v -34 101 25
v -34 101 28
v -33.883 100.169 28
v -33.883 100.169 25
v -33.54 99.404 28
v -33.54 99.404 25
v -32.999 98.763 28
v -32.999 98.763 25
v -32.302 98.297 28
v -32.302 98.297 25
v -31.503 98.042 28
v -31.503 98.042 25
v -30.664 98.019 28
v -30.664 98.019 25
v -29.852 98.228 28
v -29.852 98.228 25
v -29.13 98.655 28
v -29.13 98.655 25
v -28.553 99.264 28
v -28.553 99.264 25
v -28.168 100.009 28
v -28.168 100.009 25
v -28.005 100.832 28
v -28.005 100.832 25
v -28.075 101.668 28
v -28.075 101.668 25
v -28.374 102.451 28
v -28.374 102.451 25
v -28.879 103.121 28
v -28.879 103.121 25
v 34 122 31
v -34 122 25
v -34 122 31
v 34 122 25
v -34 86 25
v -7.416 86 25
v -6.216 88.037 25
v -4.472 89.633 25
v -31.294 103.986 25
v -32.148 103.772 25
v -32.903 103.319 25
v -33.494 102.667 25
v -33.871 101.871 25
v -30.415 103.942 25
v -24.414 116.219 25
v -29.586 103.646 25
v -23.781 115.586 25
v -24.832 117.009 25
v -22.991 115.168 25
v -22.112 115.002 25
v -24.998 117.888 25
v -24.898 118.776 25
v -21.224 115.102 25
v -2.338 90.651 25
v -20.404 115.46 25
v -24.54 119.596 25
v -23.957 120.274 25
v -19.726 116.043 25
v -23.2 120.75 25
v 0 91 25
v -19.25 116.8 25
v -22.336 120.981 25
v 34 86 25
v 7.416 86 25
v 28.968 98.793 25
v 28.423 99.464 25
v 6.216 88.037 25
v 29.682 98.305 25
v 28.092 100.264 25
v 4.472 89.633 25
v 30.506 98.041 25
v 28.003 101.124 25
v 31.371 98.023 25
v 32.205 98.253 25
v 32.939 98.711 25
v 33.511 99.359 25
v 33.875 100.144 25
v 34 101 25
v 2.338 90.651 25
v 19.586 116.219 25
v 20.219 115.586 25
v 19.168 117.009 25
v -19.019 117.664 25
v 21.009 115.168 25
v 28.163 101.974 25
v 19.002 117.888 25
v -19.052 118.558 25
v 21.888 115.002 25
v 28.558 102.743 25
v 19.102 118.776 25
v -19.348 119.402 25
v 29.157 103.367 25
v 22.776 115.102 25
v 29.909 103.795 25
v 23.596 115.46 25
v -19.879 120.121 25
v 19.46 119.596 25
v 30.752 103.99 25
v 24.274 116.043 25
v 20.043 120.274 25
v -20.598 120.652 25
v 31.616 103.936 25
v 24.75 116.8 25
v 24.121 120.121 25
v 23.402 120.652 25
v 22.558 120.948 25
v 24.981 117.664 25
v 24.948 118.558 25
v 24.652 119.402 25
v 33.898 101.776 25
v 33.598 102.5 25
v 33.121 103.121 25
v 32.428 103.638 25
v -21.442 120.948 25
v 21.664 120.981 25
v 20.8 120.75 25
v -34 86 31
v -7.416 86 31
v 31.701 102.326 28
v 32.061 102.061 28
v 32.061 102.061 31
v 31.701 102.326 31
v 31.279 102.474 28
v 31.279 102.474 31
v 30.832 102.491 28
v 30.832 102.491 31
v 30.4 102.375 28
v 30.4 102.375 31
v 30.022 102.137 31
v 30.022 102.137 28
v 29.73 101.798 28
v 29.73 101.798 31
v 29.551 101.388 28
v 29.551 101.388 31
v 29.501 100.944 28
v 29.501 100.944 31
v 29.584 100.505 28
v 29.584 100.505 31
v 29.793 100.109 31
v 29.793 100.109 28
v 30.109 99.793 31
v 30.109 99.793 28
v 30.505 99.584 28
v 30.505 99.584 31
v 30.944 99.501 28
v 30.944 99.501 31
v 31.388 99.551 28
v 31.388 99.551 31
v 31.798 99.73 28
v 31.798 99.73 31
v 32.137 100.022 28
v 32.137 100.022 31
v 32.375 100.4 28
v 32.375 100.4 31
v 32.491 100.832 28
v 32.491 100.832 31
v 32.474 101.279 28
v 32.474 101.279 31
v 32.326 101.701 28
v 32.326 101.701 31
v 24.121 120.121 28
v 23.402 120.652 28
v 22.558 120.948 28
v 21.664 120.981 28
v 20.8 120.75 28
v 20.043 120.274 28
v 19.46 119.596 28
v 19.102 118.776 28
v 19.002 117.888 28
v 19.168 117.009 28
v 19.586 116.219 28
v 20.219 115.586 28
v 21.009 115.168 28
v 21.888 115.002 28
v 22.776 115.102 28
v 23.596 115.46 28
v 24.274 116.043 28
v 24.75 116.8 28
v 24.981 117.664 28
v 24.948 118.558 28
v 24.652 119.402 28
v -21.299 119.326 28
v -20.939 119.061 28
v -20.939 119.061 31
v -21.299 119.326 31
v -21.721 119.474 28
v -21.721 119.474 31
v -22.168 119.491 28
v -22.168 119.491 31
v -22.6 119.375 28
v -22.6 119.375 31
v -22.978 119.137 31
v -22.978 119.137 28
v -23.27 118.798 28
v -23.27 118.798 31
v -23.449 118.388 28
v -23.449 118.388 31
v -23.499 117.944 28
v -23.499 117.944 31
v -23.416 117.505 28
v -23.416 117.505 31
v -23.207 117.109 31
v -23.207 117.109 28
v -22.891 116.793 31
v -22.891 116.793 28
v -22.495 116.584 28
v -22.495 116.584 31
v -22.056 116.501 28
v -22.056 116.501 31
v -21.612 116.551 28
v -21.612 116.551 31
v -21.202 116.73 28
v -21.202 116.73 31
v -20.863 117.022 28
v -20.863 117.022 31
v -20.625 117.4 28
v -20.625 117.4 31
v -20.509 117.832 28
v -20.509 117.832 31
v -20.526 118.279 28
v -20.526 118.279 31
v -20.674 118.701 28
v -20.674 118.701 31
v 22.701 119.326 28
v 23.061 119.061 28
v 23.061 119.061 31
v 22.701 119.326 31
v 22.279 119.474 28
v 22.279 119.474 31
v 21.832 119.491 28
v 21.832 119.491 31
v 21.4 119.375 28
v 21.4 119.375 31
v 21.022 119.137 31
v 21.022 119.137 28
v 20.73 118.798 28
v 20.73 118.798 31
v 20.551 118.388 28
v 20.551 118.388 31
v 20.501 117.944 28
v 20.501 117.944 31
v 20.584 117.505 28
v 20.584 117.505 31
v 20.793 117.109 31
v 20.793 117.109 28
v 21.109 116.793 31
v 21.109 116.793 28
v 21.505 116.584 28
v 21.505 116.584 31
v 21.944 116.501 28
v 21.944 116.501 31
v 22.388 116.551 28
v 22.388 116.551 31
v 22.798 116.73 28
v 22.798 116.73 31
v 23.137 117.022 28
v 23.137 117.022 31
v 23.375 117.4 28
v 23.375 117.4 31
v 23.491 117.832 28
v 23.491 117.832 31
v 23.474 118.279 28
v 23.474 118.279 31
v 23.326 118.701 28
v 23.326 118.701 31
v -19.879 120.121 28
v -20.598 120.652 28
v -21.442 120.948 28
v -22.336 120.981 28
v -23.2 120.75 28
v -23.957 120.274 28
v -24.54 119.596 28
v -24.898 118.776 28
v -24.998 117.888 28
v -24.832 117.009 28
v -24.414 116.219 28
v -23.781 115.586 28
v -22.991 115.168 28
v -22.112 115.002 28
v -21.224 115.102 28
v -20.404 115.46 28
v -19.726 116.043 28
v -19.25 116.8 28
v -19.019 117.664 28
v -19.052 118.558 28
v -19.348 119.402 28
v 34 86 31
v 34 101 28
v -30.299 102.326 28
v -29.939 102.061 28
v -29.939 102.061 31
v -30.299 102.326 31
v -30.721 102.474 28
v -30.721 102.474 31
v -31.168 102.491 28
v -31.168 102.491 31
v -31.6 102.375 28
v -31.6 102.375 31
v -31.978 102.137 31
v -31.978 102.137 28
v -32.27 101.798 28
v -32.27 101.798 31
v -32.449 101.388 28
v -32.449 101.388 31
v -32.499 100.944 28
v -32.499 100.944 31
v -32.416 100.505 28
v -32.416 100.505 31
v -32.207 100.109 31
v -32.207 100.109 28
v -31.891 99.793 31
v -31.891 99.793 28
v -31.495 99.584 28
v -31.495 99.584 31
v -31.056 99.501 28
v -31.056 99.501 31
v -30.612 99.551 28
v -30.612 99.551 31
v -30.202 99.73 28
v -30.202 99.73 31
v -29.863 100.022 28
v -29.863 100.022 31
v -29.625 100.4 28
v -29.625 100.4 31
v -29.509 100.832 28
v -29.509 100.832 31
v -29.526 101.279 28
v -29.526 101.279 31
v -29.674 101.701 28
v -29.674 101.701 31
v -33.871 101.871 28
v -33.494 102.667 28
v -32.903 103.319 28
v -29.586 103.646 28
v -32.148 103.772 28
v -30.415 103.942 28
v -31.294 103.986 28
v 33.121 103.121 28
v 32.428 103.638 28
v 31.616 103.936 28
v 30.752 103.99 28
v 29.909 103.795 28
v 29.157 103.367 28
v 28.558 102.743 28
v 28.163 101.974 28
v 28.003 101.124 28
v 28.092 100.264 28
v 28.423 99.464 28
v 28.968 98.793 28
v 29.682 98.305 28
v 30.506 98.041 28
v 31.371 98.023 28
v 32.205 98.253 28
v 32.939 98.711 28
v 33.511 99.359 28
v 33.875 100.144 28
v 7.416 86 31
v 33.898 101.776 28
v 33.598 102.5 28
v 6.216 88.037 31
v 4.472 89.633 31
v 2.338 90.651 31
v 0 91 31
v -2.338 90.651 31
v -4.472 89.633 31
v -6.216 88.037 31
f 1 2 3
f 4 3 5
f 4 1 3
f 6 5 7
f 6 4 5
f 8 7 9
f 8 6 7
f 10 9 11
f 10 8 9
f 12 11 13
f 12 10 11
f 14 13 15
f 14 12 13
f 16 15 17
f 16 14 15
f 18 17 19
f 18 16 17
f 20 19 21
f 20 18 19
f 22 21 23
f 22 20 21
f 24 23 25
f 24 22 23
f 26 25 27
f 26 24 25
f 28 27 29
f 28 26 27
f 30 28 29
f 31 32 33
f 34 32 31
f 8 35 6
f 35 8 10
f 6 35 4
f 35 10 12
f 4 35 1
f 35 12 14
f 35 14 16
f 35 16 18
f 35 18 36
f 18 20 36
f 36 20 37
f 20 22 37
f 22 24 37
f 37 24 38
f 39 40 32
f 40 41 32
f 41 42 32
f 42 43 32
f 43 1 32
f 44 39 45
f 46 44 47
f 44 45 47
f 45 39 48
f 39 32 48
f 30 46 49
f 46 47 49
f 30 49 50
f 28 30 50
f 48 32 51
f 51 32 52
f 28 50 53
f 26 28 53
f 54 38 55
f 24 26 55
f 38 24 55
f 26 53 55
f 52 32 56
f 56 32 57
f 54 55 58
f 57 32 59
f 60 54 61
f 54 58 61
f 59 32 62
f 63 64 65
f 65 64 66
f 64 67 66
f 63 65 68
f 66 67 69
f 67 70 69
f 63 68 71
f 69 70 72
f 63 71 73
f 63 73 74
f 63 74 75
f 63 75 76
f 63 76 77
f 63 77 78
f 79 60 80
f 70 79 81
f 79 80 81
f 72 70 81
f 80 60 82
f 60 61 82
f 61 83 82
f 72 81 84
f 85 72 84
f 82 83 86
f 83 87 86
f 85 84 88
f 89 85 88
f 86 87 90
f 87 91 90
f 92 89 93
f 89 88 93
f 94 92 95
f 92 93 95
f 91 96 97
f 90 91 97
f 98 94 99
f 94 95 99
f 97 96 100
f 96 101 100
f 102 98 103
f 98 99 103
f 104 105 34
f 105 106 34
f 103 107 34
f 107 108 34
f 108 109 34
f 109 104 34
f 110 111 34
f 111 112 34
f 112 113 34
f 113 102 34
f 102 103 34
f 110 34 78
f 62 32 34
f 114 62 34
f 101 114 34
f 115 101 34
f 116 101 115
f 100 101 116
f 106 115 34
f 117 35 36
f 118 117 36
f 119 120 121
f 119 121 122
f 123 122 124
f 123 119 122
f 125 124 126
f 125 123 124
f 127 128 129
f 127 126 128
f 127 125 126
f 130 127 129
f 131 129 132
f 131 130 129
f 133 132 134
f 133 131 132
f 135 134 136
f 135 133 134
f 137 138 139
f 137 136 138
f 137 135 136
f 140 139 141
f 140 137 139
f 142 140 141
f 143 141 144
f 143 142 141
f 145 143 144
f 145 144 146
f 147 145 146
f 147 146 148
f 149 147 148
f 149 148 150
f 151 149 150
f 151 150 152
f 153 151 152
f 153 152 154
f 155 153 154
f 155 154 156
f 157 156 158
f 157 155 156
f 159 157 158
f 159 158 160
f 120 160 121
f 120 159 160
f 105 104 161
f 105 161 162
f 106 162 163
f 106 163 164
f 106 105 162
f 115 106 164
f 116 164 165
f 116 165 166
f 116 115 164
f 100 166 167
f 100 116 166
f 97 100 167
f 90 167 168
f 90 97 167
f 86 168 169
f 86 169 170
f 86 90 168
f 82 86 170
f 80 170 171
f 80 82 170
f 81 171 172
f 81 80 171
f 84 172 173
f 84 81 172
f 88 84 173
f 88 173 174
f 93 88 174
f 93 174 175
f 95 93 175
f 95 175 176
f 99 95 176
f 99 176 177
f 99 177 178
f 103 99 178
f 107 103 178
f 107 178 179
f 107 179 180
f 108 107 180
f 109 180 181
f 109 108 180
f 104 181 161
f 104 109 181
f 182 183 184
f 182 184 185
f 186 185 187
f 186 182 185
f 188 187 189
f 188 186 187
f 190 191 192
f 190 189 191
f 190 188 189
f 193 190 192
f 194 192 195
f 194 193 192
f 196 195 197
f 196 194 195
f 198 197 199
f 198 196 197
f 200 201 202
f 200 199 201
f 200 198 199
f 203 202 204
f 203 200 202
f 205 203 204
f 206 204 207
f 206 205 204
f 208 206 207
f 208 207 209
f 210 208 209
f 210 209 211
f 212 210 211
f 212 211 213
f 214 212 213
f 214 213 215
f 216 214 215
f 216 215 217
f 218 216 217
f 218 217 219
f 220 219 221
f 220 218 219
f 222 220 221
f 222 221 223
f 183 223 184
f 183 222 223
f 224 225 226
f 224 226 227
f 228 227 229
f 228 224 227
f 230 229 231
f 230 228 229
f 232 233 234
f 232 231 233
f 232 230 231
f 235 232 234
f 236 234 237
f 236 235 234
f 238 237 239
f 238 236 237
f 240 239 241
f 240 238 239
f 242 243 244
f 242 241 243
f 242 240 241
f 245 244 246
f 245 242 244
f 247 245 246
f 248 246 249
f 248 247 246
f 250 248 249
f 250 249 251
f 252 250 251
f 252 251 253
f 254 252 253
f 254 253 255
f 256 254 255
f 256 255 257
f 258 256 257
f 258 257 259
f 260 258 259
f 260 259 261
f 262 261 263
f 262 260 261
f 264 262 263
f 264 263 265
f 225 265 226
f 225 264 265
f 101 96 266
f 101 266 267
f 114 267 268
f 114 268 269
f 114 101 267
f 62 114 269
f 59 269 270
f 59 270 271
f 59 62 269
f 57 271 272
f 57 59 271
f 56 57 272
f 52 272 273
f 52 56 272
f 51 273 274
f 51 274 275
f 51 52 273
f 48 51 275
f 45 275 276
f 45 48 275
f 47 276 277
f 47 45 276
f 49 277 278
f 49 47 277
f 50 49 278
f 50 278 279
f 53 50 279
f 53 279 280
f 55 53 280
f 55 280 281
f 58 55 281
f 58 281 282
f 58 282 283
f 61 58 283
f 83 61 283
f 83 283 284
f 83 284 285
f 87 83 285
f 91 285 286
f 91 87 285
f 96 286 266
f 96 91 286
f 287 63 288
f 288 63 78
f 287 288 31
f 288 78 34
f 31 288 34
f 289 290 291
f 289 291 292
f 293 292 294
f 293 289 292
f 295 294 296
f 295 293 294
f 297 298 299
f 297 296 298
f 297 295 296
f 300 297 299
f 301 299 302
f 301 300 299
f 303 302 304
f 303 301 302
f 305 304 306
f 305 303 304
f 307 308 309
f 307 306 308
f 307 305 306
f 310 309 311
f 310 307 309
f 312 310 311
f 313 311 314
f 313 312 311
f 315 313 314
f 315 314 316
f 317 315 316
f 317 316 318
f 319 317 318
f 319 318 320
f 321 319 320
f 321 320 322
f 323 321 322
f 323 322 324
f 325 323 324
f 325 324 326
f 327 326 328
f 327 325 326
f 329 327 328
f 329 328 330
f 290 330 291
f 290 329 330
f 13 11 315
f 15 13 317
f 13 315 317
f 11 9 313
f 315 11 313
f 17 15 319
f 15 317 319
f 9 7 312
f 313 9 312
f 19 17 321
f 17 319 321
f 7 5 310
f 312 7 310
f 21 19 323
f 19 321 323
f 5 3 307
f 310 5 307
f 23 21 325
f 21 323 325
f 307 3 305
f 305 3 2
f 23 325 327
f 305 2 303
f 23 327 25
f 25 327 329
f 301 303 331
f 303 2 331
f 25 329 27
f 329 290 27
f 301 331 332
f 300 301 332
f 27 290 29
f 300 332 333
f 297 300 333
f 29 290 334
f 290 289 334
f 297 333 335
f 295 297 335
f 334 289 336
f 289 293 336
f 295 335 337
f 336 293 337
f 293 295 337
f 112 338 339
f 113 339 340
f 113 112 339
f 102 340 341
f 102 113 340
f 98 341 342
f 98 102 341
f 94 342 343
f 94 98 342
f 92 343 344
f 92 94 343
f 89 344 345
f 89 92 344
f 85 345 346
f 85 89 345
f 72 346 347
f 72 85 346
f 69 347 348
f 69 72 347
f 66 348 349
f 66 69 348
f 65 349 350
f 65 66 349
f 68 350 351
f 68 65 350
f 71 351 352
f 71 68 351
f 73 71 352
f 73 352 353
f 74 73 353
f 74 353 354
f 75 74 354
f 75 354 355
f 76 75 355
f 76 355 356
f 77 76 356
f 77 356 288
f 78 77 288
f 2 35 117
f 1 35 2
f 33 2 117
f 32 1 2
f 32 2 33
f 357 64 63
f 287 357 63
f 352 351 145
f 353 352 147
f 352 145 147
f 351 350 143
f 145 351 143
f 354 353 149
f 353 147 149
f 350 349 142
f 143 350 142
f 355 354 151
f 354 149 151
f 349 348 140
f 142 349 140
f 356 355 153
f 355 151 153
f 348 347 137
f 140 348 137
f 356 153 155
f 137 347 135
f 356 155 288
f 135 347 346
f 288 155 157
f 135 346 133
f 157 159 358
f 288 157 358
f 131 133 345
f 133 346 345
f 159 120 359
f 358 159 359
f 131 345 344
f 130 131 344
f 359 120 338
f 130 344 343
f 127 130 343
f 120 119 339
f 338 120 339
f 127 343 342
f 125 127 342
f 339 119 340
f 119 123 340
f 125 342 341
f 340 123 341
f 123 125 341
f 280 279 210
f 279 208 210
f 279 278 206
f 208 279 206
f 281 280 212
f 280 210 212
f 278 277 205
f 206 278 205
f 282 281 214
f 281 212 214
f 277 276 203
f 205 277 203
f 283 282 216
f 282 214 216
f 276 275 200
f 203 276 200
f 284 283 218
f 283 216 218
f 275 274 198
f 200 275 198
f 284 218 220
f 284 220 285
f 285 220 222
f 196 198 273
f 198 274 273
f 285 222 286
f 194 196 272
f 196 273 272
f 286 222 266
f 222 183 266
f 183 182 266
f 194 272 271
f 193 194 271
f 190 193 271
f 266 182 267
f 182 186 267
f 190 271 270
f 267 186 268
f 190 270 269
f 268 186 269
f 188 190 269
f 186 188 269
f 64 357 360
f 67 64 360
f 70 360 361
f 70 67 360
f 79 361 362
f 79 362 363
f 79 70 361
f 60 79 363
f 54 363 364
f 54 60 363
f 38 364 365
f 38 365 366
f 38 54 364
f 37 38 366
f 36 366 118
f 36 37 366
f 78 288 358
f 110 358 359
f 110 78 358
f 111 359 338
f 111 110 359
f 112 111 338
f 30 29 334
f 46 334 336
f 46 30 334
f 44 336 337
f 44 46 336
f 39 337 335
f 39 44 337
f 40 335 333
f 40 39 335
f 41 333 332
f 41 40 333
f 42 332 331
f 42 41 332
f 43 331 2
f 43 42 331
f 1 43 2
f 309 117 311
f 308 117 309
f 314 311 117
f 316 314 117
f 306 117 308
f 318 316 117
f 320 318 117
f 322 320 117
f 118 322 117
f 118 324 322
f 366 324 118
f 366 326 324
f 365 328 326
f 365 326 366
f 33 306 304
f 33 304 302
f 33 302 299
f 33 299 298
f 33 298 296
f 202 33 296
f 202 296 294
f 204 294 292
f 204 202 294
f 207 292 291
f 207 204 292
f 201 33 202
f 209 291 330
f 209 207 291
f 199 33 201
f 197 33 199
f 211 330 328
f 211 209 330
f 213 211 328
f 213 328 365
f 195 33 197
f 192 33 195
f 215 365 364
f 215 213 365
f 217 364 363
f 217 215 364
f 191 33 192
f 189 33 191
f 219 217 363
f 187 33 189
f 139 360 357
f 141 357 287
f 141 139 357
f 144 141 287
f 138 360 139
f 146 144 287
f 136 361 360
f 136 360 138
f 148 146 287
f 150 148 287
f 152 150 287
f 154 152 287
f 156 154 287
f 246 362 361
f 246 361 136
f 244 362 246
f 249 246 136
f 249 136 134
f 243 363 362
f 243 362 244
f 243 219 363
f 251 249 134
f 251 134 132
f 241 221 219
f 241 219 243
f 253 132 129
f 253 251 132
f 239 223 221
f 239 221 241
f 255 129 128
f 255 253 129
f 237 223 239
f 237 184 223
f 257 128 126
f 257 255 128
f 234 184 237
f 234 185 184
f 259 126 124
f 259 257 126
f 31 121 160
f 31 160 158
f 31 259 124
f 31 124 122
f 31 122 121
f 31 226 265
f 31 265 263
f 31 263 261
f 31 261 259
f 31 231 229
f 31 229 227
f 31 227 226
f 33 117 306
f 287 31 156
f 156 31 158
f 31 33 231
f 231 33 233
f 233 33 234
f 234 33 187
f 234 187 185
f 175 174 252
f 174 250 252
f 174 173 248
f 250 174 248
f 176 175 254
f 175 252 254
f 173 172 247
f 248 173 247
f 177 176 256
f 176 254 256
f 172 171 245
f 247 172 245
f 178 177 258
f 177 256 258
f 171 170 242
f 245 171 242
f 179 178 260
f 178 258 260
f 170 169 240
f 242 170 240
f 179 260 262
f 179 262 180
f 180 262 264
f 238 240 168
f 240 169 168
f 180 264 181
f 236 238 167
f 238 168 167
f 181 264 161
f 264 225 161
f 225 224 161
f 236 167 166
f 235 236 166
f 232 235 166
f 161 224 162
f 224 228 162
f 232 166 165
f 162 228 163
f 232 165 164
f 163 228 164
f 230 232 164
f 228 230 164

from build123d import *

# Parameters (mm, degrees)
CYLINDER1905_R               = 3
CYLINDER1905_DEPTH           = 3
CYLINDER1905_PLACEMENT_ANGLE = 45
CYLINDER1904_R               = 3
CYLINDER1904_DEPTH           = 3
CYLINDER1904_PLACEMENT_ANGLE = 45
CYLINDER1907_R               = 3
CYLINDER1907_DEPTH           = 3
CYLINDER1907_PLACEMENT_ANGLE = 45
CYLINDER1909_R               = 3
CYLINDER1909_DEPTH           = 3
CYLINDER1909_PLACEMENT_ANGLE = 45
CYLINDER1906_R               = 1.5
CYLINDER1906_DEPTH           = 50
CYLINDER1906_PLACEMENT_ANGLE = 45
CYLINDER1908_R               = 1.5
CYLINDER1908_DEPTH           = 50
CYLINDER1908_PLACEMENT_ANGLE = 45
CYLINDER1901_R               = 8
CYLINDER1901_DEPTH           = 6
CYLINDER1900_R               = 1.5
CYLINDER1900_DEPTH           = 50
CYLINDER1900_PLACEMENT_ANGLE = 45
CYLINDER1896_R               = 1.5
CYLINDER1896_DEPTH           = 50
CYLINDER1896_PLACEMENT_ANGLE = 45
BOX800_W                     = 68
BOX800_H                     = 36
BOX800_DEPTH                 = 6


with BuildPart() as v_lec1905:
    # Cylinder1905 → Cylinder1905 (new body)
    with BuildSketch(Plane.XY):
        Circle(CYLINDER1905_R)
    extrude(amount=CYLINDER1905_DEPTH)


with BuildPart() as v_lec1905_1:
    # Cylinder1905 placement: moved
    add(v_lec1905.part.moved(Location((22, 118, 0))).rotate(Axis((22, 118, 0), (0, 0, 1)), CYLINDER1905_PLACEMENT_ANGLE))


with BuildPart() as compound956:
    # Cylinder1904 → Cylinder1904 (new body)
    with BuildSketch(Plane.XY):
        Circle(CYLINDER1904_R)
    extrude(amount=CYLINDER1904_DEPTH)


with BuildPart() as compound956_1:
    # Cylinder1904 placement: moved
    add(compound956.part.moved(Location((-22, 118, 0))).rotate(Axis((-22, 118, 0), (0, 0, 1)), CYLINDER1904_PLACEMENT_ANGLE))

    # Compound956: union Válec1905
    add(v_lec1905_1.part)


with BuildPart() as compound956_2:
    # Compound956 placement: moved
    add(compound956_1.part.moved(Location((0, 0, 25))))


with BuildPart() as v_lec1907:
    # Cylinder1907 → Cylinder1907 (new body)
    with BuildSketch(Plane.XY):
        Circle(CYLINDER1907_R)
    extrude(amount=CYLINDER1907_DEPTH)


with BuildPart() as v_lec1907_1:
    # Cylinder1907 placement: moved
    add(v_lec1907.part.moved(Location((31, 101, 0))).rotate(Axis((31, 101, 0), (0, 0, 1)), CYLINDER1907_PLACEMENT_ANGLE))


with BuildPart() as compound957:
    # Cylinder1909 → Cylinder1909 (new body)
    with BuildSketch(Plane.XY):
        Circle(CYLINDER1909_R)
    extrude(amount=CYLINDER1909_DEPTH)


with BuildPart() as compound957_1:
    # Cylinder1909 placement: moved
    add(compound957.part.moved(Location((-31, 101, 0))).rotate(Axis((-31, 101, 0), (0, 0, 1)), CYLINDER1909_PLACEMENT_ANGLE))

    # Compound957: union Válec1907
    add(v_lec1907_1.part)


with BuildPart() as compound957_2:
    # Compound957 placement: moved
    add(compound957_1.part.moved(Location((0, 0, 25))))


with BuildPart() as v_lec1906:
    # Cylinder1906 → Cylinder1906 (new body)
    with BuildSketch(Plane.XY):
        Circle(CYLINDER1906_R)
    extrude(amount=CYLINDER1906_DEPTH)


with BuildPart() as v_lec1906_1:
    # Cylinder1906 placement: moved
    add(v_lec1906.part.moved(Location((22, 118, 0))).rotate(Axis((22, 118, 0), (0, 0, 1)), CYLINDER1906_PLACEMENT_ANGLE))


with BuildPart() as compound958:
    # Cylinder1908 → Cylinder1908 (new body)
    with BuildSketch(Plane.XY):
        Circle(CYLINDER1908_R)
    extrude(amount=CYLINDER1908_DEPTH)


with BuildPart() as compound958_1:
    # Cylinder1908 placement: moved
    add(compound958.part.moved(Location((-22, 118, 0))).rotate(Axis((-22, 118, 0), (0, 0, 1)), CYLINDER1908_PLACEMENT_ANGLE))

    # Compound958: union Válec1906
    add(v_lec1906_1.part)


with BuildPart() as v_lec1901:
    # Cylinder1901 → Cylinder1901 (new body)
    with BuildSketch(Plane(origin=(0, 83, 25), x_dir=(1, 0, 0), z_dir=(0, 0, 1))):
        Circle(CYLINDER1901_R)
    extrude(amount=CYLINDER1901_DEPTH)


with BuildPart() as v_lec1900:
    # Cylinder1900 → Cylinder1900 (new body)
    with BuildSketch(Plane.XY):
        Circle(CYLINDER1900_R)
    extrude(amount=CYLINDER1900_DEPTH)


with BuildPart() as v_lec1900_1:
    # Cylinder1900 placement: moved
    add(v_lec1900.part.moved(Location((31, 101, 0))).rotate(Axis((31, 101, 0), (0, 0, 1)), CYLINDER1900_PLACEMENT_ANGLE))


with BuildPart() as compound954:
    # Cylinder1896 → Cylinder1896 (new body)
    with BuildSketch(Plane.XY):
        Circle(CYLINDER1896_R)
    extrude(amount=CYLINDER1896_DEPTH)


with BuildPart() as compound954_1:
    # Cylinder1896 placement: moved
    add(compound954.part.moved(Location((-31, 101, 0))).rotate(Axis((-31, 101, 0), (0, 0, 1)), CYLINDER1896_PLACEMENT_ANGLE))

    # Compound954: union Válec1900
    add(v_lec1900_1.part)


with BuildPart() as cut610:
    # Box800 → Box800 (new body)
    with BuildSketch(Plane(origin=(-34, 86, 25), x_dir=(1, 0, 0), z_dir=(0, 0, 1))):
        with Locations((34, 18)):
            Rectangle(BOX800_W, BOX800_H)
    extrude(amount=BOX800_DEPTH)

    # Cut606: cut Compound954
    add(compound954_1.part, mode=Mode.SUBTRACT)

    # Cut603: cut Válec1901
    add(v_lec1901.part, mode=Mode.SUBTRACT)

    # Cut609: cut Compound958
    add(compound958_1.part, mode=Mode.SUBTRACT)

    # Cut611: cut Compound957
    add(compound957_2.part, mode=Mode.SUBTRACT)

    # Cut610: cut Compound956
    add(compound956_2.part, mode=Mode.SUBTRACT)


solid = cut610.part
